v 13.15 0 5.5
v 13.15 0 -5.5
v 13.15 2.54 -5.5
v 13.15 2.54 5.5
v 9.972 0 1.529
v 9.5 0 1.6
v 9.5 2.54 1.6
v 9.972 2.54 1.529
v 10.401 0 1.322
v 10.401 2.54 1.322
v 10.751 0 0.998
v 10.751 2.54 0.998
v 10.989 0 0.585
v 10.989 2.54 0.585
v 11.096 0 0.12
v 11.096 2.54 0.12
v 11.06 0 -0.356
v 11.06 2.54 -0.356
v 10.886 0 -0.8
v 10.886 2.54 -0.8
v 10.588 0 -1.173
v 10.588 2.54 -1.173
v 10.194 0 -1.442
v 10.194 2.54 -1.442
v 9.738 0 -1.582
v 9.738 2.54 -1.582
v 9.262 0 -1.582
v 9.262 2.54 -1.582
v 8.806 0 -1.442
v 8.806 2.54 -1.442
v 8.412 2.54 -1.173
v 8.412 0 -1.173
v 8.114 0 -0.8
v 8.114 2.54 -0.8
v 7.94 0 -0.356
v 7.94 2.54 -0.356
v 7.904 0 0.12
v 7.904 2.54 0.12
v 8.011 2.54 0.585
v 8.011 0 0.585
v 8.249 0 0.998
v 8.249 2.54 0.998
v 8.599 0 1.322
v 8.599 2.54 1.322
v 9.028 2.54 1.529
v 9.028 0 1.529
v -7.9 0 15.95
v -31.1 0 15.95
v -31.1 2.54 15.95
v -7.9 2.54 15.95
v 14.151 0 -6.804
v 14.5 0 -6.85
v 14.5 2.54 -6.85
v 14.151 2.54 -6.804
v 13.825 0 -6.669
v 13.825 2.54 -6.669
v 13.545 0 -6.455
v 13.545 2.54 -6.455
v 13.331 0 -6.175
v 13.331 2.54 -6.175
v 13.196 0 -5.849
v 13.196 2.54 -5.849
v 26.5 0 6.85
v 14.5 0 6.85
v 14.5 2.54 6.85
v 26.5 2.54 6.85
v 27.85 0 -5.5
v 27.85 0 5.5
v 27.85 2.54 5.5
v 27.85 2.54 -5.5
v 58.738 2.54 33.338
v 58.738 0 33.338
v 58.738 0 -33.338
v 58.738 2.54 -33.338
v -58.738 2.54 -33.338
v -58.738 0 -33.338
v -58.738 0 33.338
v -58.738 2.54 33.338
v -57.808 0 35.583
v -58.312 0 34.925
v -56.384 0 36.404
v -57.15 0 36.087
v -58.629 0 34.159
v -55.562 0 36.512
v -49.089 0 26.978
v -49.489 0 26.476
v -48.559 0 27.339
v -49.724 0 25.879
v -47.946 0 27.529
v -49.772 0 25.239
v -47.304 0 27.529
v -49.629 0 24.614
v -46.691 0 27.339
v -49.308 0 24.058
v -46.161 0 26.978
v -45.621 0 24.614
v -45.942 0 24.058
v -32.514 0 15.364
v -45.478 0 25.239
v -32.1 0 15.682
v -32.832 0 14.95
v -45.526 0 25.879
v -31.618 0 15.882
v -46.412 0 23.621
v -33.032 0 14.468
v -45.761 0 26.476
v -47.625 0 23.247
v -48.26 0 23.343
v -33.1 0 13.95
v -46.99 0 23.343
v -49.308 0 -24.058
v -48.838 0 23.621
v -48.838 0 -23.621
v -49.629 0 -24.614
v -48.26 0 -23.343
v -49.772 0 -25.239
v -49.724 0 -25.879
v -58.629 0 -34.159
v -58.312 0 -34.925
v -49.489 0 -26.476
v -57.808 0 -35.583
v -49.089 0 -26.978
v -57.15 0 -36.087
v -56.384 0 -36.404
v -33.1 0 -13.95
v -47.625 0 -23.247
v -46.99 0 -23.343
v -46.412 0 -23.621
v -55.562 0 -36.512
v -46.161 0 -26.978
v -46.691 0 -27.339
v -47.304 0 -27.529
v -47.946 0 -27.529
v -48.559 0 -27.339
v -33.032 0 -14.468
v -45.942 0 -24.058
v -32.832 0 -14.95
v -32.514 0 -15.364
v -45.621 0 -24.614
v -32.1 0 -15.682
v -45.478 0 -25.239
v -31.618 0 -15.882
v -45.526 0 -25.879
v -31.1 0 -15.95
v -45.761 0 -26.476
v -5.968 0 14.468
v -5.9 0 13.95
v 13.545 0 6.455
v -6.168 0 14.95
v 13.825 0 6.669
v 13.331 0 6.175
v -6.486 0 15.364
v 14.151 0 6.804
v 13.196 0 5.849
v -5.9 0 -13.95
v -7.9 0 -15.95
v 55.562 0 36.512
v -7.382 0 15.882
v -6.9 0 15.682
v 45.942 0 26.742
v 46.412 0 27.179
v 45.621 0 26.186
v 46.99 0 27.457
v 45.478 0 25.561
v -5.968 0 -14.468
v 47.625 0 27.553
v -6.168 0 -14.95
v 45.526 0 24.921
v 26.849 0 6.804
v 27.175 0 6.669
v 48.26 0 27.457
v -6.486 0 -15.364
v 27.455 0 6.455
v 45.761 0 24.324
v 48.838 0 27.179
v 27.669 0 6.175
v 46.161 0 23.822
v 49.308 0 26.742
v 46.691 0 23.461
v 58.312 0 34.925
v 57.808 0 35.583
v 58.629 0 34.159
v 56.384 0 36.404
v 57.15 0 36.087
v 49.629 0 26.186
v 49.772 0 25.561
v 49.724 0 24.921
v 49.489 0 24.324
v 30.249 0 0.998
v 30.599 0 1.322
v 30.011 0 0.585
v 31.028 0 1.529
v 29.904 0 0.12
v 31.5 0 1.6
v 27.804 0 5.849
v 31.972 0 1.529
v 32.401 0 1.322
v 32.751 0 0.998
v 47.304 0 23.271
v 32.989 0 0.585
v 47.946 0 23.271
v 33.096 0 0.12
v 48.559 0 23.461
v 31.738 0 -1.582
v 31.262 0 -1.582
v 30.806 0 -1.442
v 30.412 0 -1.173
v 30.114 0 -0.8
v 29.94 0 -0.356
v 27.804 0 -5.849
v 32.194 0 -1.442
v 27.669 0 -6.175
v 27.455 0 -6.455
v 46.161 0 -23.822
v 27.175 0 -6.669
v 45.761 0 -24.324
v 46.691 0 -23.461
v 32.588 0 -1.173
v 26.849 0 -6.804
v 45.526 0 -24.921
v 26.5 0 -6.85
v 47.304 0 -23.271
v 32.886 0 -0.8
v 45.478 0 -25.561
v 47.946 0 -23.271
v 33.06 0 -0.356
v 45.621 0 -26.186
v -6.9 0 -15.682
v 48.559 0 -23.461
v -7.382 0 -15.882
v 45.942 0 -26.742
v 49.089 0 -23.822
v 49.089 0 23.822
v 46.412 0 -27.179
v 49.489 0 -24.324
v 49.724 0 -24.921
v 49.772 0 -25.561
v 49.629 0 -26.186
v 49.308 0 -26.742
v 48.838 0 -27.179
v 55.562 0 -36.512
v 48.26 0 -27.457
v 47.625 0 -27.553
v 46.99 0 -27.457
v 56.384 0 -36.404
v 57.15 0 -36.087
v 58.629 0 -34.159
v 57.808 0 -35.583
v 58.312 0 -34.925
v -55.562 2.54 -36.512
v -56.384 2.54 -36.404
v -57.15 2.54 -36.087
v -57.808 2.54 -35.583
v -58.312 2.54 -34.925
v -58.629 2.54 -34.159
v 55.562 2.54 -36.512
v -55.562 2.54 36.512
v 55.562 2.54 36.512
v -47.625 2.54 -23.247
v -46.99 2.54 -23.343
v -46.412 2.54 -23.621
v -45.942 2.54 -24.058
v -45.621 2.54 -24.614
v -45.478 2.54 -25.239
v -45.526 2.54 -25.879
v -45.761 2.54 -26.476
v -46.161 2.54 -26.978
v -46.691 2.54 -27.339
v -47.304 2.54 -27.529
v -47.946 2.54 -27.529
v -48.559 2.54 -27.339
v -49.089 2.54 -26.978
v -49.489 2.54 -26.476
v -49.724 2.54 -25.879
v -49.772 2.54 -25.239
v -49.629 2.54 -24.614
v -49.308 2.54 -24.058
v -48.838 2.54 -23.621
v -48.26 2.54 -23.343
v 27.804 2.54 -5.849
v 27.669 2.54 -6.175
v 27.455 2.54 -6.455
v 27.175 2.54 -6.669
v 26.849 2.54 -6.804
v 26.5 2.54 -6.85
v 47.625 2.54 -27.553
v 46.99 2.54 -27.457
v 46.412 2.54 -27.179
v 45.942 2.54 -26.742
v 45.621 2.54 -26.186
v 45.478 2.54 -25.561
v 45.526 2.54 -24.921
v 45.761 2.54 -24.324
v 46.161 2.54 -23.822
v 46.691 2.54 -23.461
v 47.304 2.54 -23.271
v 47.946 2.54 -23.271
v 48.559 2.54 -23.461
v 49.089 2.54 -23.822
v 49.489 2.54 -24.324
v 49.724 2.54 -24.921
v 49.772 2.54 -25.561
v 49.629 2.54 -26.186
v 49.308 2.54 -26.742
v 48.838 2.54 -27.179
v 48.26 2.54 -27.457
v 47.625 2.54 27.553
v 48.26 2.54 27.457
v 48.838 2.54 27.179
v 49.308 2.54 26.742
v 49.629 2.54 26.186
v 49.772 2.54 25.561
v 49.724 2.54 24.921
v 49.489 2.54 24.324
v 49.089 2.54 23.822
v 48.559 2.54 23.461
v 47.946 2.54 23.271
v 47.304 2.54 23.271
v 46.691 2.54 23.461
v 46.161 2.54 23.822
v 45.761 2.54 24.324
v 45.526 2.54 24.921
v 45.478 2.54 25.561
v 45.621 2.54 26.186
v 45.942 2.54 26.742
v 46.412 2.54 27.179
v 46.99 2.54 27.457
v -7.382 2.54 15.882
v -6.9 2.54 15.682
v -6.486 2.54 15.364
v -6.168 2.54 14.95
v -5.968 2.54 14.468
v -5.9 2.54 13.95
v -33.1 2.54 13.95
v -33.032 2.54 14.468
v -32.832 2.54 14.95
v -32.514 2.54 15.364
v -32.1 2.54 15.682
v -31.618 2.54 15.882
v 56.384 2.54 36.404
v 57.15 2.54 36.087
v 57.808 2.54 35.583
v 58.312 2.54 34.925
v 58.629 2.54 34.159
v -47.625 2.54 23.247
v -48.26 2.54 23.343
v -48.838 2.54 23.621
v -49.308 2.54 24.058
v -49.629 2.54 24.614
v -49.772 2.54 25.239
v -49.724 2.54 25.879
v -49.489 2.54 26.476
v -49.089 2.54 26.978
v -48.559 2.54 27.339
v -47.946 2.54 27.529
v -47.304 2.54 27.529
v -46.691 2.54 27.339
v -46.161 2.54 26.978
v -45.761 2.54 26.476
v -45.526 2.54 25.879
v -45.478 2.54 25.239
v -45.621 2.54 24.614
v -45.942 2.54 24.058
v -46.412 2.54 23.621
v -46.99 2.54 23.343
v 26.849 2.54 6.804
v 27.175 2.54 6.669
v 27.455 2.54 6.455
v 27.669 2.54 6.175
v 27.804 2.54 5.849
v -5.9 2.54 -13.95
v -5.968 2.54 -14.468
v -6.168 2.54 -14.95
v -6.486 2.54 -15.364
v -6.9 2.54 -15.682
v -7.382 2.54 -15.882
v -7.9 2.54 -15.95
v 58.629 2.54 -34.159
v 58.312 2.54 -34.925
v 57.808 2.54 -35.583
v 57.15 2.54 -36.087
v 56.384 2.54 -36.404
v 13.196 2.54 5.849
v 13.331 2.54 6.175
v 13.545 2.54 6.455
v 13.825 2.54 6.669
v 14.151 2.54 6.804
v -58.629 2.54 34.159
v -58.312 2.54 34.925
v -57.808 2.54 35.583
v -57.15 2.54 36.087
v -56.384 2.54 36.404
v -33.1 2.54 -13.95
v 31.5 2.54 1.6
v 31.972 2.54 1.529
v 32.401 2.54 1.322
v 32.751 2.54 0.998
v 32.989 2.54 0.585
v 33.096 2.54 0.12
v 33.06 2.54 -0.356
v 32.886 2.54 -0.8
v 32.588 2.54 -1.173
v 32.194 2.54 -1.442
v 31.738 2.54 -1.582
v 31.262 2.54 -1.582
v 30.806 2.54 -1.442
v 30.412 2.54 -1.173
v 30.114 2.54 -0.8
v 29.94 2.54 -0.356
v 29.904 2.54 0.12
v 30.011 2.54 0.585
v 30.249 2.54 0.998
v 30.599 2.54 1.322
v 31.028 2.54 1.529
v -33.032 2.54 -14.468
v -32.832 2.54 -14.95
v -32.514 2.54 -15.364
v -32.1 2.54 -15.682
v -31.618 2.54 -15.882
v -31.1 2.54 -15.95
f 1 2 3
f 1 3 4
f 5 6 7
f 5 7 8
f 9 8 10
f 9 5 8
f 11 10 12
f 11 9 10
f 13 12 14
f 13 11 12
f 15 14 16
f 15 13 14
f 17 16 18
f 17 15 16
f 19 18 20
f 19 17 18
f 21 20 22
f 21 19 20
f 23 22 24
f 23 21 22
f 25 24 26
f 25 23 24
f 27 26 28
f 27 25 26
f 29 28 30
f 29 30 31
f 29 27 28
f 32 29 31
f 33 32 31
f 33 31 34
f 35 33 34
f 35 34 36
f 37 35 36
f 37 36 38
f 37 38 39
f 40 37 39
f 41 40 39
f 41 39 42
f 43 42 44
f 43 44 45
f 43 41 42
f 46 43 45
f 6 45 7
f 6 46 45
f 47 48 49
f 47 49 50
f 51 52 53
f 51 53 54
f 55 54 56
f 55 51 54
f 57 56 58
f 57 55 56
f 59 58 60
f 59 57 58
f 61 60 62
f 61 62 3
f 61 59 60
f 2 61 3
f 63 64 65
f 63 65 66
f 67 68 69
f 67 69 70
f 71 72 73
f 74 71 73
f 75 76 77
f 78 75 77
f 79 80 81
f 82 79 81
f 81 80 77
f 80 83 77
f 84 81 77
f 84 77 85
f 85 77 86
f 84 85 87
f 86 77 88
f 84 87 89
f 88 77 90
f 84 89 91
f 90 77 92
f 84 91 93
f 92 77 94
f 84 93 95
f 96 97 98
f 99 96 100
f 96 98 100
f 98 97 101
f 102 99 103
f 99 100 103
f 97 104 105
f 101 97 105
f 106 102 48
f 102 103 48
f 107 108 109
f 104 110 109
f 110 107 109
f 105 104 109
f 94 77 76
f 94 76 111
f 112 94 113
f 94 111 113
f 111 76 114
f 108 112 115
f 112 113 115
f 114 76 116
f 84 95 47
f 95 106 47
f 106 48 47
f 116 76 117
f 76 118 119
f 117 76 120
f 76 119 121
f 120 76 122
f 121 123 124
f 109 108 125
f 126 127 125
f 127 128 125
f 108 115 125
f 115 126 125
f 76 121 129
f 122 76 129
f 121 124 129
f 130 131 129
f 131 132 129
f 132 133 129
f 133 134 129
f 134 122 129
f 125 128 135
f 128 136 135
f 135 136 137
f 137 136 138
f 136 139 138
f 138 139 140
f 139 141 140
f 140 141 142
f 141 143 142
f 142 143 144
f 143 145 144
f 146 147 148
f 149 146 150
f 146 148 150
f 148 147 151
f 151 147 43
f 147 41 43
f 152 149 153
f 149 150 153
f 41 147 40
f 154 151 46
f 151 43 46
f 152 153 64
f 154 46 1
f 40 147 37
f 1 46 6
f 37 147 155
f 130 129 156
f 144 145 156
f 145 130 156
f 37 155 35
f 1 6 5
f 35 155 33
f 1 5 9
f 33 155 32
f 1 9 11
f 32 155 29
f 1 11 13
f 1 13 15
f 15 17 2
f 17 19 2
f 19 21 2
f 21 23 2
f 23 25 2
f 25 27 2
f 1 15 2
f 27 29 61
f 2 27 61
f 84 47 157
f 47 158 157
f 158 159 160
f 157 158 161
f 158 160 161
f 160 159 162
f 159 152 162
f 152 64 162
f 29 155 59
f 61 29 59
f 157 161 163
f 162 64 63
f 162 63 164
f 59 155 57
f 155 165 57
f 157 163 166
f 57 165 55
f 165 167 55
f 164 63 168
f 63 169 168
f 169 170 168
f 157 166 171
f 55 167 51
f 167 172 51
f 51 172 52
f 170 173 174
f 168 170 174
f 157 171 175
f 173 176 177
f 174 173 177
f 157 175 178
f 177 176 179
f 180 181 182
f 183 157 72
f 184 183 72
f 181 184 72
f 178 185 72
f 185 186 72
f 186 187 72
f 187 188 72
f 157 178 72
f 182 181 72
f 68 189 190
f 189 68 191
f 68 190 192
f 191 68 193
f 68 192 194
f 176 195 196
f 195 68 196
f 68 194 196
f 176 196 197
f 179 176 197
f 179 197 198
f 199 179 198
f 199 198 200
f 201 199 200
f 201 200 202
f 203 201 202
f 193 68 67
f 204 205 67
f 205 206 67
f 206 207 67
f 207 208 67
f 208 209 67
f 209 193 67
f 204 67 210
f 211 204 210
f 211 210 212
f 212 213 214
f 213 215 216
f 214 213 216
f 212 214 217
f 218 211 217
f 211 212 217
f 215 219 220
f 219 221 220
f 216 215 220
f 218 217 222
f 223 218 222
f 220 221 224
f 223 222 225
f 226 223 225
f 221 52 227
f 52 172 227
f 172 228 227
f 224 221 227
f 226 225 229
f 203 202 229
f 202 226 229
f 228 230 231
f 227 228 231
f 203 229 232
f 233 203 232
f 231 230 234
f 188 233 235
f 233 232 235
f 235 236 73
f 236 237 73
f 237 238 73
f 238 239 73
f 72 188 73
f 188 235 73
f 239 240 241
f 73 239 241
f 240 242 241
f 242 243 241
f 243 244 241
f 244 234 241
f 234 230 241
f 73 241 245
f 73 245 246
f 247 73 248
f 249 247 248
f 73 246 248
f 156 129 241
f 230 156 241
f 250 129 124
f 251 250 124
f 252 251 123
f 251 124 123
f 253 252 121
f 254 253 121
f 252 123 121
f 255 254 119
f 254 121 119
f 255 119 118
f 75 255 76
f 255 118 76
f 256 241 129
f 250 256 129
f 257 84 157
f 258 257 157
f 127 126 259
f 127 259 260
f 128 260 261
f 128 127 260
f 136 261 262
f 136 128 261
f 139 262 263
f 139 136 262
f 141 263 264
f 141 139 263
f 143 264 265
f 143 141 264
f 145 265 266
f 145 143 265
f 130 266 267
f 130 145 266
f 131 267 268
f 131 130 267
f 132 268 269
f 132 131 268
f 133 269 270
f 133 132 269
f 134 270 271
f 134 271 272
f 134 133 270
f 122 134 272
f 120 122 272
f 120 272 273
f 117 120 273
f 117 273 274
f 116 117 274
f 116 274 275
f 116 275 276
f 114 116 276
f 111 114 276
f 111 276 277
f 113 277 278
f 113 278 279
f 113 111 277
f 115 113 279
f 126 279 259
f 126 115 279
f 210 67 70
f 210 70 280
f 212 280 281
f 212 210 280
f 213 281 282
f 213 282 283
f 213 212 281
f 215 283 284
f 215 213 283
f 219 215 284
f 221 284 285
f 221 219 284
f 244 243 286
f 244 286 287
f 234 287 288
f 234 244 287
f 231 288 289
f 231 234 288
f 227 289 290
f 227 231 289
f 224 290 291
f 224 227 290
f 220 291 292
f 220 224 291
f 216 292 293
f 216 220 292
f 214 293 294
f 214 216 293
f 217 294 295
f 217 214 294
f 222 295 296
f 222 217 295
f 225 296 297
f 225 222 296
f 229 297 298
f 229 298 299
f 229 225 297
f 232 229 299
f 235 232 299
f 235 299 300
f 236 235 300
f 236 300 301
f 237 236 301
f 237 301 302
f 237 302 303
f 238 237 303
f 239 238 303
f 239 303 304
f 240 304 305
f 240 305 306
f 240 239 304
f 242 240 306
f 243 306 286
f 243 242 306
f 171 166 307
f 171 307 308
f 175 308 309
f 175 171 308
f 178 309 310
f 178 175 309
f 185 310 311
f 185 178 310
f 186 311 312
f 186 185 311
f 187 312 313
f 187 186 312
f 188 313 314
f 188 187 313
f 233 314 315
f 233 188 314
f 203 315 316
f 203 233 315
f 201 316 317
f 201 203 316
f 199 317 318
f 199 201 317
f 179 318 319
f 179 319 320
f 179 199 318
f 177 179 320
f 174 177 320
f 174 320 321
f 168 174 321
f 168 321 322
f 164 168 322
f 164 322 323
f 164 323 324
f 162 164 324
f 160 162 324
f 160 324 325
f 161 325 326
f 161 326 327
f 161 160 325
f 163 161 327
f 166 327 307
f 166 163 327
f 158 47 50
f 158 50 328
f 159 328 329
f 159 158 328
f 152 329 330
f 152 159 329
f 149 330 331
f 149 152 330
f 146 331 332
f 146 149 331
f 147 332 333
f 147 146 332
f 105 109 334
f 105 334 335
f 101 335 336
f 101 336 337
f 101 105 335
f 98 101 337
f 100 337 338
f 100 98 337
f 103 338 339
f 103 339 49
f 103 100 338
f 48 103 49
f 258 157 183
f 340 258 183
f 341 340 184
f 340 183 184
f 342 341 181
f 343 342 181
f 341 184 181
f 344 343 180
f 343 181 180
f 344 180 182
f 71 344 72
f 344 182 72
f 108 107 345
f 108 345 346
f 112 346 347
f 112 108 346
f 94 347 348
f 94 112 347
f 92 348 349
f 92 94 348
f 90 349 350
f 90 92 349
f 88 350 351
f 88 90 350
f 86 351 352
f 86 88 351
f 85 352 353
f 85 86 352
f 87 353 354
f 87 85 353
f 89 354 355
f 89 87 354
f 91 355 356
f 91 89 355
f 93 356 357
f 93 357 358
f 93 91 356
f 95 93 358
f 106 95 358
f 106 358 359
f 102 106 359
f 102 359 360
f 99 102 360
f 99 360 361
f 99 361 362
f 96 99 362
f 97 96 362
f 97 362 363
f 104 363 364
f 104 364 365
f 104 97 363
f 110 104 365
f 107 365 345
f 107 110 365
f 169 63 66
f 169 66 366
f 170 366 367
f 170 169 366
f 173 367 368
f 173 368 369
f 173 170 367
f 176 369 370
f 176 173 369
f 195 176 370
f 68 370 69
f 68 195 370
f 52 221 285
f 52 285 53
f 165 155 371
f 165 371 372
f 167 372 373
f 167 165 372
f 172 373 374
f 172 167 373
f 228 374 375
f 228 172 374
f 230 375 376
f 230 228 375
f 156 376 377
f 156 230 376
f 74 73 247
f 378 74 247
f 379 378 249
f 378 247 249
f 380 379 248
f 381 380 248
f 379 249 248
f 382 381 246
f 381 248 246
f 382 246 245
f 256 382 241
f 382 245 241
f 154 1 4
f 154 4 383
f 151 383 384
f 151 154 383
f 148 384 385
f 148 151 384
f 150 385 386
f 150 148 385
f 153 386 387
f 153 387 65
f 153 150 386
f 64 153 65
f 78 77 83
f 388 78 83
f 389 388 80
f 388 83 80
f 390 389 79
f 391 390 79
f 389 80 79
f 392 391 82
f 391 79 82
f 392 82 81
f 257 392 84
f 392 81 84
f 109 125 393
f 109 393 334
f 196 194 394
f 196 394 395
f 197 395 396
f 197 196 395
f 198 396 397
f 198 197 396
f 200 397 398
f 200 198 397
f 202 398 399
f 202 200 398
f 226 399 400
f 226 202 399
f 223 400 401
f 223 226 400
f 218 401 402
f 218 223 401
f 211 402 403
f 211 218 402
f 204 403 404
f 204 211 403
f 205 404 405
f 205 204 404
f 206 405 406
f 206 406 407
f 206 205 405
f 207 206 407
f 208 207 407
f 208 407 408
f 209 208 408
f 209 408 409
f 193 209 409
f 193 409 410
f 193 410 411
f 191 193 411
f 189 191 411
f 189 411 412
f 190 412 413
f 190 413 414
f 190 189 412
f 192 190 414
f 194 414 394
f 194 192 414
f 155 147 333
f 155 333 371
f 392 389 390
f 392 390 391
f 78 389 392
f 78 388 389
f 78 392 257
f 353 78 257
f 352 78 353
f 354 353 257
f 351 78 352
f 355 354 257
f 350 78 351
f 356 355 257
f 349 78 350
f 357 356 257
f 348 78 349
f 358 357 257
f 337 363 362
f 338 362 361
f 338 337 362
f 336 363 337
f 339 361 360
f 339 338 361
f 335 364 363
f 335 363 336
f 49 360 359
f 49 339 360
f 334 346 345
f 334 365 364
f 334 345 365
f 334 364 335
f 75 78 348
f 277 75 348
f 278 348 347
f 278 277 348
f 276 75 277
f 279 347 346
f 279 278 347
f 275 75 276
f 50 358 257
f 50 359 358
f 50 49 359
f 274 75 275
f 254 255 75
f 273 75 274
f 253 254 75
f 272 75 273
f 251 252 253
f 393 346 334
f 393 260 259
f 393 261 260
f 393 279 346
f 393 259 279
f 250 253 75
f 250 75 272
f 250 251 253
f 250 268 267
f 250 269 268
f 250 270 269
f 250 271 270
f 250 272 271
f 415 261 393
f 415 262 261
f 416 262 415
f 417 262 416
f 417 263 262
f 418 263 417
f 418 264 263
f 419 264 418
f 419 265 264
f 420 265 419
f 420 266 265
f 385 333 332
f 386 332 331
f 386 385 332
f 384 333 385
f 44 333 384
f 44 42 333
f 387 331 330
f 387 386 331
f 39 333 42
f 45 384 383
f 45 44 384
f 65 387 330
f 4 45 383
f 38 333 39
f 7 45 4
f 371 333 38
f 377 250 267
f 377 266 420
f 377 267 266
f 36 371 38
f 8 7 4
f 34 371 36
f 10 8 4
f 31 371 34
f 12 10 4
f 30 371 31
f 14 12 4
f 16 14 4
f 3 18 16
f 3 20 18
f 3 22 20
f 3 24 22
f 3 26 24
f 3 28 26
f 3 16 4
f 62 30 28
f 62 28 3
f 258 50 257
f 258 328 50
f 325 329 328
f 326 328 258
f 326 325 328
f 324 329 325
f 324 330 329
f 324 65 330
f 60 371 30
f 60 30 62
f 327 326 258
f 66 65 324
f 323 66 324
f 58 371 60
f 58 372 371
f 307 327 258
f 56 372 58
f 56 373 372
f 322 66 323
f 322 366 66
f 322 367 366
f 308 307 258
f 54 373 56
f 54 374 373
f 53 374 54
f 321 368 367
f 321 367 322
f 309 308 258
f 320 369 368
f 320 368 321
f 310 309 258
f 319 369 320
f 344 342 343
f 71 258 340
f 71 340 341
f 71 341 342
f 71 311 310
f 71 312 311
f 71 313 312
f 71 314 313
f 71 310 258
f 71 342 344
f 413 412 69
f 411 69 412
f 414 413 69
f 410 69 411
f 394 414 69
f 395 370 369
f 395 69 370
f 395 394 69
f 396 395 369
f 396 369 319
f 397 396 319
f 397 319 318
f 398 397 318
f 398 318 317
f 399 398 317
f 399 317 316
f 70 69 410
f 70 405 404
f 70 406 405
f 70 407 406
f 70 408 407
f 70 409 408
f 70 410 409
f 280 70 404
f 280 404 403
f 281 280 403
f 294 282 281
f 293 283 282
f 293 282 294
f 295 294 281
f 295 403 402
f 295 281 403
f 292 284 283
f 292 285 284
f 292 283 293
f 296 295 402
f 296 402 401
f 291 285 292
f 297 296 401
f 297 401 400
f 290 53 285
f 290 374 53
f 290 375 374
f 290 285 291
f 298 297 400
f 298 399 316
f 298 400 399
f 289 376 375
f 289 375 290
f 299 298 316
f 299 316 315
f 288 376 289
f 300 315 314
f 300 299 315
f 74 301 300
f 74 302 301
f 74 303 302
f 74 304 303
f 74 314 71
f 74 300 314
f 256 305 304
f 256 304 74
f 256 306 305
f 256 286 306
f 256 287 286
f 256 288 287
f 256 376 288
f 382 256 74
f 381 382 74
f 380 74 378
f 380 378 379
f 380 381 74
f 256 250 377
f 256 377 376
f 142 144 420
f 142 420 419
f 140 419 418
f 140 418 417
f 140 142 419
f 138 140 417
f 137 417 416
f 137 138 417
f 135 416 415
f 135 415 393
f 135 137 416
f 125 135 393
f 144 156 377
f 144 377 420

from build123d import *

# Parameters (mm, degrees)
SKETCH2_R           = 1.6
SKETCH2_R_2         = 2.15265
BOSS_EXTRUDE1_DEPTH = 2.54


with BuildPart() as part:
    # Sketch2 → Boss-Extrude1 (new body)
    with BuildSketch(Plane(origin=(0, 0, 0), x_dir=(1, 0, 0), z_dir=(0, 1, 0))):
        with BuildLine():
            Line((-55.5625, -36.5125), (55.5625, -36.5125))
            ThreePointArc((55.5625, -36.5125), (57.80756403, -35.58256403), (58.7375, -33.3375))
            Line((58.7375, -33.3375), (58.7375, 33.3375))
            ThreePointArc((58.7375, 33.3375), (57.80756403, 35.58256403), (55.5625, 36.5125))
            Line((55.5625, 36.5125), (-55.5625, 36.5125))
            ThreePointArc((-55.5625, 36.5125), (-57.80756403, 35.58256403), (-58.7375, 33.3375))
            Line((-58.7375, 33.3375), (-58.7375, -33.3375))
            ThreePointArc((-58.7375, -33.3375), (-57.80756403, -35.58256403), (-55.5625, -36.5125))
        make_face()
        with Locations(Location((9.5, 0, 0), (0, 0, 270))):
            Circle(SKETCH2_R, mode=Mode.SUBTRACT)
        with Locations(Location((31.5, 0, 0), (0, 0, 270))):
            Circle(SKETCH2_R, mode=Mode.SUBTRACT)
        with Locations(Location((47.625, 25.4, 0), (0, 0, 90))):
            Circle(SKETCH2_R_2, mode=Mode.SUBTRACT)
        with Locations(Location((47.625, -25.4, 0), (0, 0, 270))):
            Circle(SKETCH2_R_2, mode=Mode.SUBTRACT)
        with Locations(Location((-47.625, 25.4, 0), (0, 0, 270))):
            Circle(SKETCH2_R_2, mode=Mode.SUBTRACT)
        with Locations(Location((-47.625, -25.4, 0), (0, 0, 90))):
            Circle(SKETCH2_R_2, mode=Mode.SUBTRACT)
        with BuildLine():
            Line((14.5, -6.85), (26.5, -6.85))
            ThreePointArc((26.5, -6.85), (27.454594155, -6.454594155), (27.85, -5.5))
            Line((27.85, -5.5), (27.85, 5.5))
            ThreePointArc((27.85, 5.5), (27.454594155, 6.454594155), (26.5, 6.85))
            Line((26.5, 6.85), (14.5, 6.85))
            ThreePointArc((14.5, 6.85), (13.545405845, 6.454594155), (13.15, 5.5))
            Line((13.15, 5.5), (13.15, -5.5))
            ThreePointArc((13.15, -5.5), (13.545405845, -6.454594155), (14.5, -6.85))
        make_face(mode=Mode.SUBTRACT)
        with BuildLine():
            Line((-7.9, 15.95), (-31.1, 15.95))
            ThreePointArc((-31.1, 15.95), (-32.514213562, 15.364213562), (-33.1, 13.95))
            Line((-33.1, 13.95), (-33.1, -13.95))
            ThreePointArc((-33.1, -13.95), (-32.514213562, -15.364213562), (-31.1, -15.95))
            Line((-31.1, -15.95), (-7.9, -15.95))
            ThreePointArc((-7.9, -15.95), (-6.485786438, -15.364213562), (-5.9, -13.95))
            Line((-5.9, -13.95), (-5.9, 13.95))
            ThreePointArc((-5.9, 13.95), (-6.485786438, 15.364213562), (-7.9, 15.95))
        make_face(mode=Mode.SUBTRACT)
    extrude(amount=BOSS_EXTRUDE1_DEPTH)


solid = part.part
